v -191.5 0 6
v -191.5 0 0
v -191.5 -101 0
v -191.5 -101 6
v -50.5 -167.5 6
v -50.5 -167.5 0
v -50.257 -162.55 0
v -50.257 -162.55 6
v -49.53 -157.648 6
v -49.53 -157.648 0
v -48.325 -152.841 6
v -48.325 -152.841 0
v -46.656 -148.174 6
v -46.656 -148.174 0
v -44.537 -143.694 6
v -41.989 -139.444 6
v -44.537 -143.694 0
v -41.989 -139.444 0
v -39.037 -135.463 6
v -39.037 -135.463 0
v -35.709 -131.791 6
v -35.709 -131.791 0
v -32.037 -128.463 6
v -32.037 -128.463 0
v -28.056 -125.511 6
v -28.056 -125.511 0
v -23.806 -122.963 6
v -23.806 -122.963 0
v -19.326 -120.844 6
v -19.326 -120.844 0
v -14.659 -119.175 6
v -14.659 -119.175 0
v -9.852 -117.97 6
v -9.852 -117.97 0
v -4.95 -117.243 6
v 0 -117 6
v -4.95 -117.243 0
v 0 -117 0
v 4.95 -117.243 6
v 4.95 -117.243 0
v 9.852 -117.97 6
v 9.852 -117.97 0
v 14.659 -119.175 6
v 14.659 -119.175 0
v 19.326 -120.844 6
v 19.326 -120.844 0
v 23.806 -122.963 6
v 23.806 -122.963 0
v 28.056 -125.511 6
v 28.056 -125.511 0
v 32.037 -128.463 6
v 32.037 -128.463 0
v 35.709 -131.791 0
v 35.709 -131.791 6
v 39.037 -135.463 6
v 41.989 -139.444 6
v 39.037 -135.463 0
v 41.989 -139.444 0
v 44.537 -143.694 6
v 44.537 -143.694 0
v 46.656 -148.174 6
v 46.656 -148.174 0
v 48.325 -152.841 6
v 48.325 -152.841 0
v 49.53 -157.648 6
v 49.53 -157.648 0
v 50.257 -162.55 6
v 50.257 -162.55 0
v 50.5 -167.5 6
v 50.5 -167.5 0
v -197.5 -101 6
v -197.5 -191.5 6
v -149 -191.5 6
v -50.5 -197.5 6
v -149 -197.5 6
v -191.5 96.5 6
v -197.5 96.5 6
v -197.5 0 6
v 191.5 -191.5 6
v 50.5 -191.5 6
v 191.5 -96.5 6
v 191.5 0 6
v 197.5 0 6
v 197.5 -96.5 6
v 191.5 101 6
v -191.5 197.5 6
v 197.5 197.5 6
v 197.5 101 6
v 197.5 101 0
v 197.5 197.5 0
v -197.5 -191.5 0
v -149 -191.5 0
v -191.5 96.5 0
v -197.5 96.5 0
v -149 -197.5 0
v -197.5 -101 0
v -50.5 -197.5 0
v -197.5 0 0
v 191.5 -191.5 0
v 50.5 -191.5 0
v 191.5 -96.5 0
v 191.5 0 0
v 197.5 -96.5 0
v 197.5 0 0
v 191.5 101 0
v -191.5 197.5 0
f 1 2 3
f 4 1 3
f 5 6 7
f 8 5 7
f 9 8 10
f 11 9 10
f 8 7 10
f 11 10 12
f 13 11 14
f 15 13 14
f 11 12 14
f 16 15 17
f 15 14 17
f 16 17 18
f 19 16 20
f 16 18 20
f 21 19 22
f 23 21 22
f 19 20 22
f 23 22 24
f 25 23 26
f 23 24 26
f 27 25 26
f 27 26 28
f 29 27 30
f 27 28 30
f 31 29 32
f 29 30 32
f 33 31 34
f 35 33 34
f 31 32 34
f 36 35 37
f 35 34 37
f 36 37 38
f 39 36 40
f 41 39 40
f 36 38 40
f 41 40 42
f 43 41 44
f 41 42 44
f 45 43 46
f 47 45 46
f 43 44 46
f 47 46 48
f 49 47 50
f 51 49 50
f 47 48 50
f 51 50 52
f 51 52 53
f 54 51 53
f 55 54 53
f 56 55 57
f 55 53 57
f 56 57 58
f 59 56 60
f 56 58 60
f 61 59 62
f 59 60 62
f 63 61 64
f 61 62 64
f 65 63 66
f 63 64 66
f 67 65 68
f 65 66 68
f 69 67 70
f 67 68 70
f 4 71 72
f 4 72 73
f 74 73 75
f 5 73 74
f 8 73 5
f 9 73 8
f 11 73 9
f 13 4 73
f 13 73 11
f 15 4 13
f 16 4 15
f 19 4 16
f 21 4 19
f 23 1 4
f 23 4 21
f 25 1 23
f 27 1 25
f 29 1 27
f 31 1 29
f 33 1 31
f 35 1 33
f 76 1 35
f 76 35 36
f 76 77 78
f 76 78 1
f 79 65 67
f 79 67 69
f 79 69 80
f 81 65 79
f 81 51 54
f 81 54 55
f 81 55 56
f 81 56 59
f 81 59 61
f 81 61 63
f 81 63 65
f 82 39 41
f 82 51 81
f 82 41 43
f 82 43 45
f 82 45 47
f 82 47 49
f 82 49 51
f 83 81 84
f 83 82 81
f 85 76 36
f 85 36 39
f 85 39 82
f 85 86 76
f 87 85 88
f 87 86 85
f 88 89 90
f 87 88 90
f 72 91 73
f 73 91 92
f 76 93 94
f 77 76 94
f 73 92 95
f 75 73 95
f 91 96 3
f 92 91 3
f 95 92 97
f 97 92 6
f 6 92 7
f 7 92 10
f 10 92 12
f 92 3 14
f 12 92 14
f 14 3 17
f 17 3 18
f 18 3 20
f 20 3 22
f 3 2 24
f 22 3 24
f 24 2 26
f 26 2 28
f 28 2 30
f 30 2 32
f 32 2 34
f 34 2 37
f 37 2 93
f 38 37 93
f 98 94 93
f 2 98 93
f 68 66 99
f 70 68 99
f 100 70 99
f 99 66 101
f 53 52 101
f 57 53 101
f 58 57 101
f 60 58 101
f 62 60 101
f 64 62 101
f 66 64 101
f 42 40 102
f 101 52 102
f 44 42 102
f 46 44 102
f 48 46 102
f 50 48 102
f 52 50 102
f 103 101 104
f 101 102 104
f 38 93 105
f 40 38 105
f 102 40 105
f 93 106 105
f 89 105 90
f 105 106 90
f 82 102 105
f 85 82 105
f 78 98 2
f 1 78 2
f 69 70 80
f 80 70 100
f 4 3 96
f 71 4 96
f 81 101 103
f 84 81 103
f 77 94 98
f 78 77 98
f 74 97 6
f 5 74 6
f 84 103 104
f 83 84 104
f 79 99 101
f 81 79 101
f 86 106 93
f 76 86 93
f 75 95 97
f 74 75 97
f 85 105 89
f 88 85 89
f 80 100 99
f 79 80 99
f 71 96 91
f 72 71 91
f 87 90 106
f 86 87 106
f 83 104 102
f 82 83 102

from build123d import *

# Parameters (mm, degrees)
BOSS_EXTRUDE1_DEPTH = 6


with BuildPart() as part:
    # Sketch1 → Boss-Extrude1 (new body)
    with BuildSketch(Plane.XY):
        with BuildLine():
            Line((-149, -191.5), (-149, -197.5))
            Line((-149, -197.5), (-50.5, -197.5))
            Line((-50.5, -197.5), (-50.5, -167.5))
            ThreePointArc((-50.5, -167.5), (0, -117), (50.5, -167.5))
            Line((50.5, -167.5), (50.5, -191.5))
            Line((50.5, -191.5), (191.5, -191.5))
            Line((191.5, -191.5), (191.5, -96.5))
            Line((191.5, -96.5), (197.5, -96.5))
            Line((197.5, -96.5), (197.5, 0))
            Line((197.5, 0), (191.5, 0))
            Line((191.5, 0), (191.5, 101))
            Line((191.5, 101), (197.5, 101))
            Line((197.5, 101), (197.5, 197.5))
            Line((197.5, 197.5), (-191.5, 197.5))
            Line((-191.5, 197.5), (-191.5, 96.5))
            Line((-191.5, 96.5), (-197.5, 96.5))
            Line((-197.5, 96.5), (-197.5, 0))
            Line((-197.5, 0), (-191.5, 0))
            Line((-191.5, 0), (-191.5, -101))
            Line((-191.5, -101), (-197.5, -101))
            Line((-197.5, -101), (-197.5, -191.5))
            Line((-197.5, -191.5), (-149, -191.5))
        make_face()
    extrude(amount=BOSS_EXTRUDE1_DEPTH)


solid = part.part
